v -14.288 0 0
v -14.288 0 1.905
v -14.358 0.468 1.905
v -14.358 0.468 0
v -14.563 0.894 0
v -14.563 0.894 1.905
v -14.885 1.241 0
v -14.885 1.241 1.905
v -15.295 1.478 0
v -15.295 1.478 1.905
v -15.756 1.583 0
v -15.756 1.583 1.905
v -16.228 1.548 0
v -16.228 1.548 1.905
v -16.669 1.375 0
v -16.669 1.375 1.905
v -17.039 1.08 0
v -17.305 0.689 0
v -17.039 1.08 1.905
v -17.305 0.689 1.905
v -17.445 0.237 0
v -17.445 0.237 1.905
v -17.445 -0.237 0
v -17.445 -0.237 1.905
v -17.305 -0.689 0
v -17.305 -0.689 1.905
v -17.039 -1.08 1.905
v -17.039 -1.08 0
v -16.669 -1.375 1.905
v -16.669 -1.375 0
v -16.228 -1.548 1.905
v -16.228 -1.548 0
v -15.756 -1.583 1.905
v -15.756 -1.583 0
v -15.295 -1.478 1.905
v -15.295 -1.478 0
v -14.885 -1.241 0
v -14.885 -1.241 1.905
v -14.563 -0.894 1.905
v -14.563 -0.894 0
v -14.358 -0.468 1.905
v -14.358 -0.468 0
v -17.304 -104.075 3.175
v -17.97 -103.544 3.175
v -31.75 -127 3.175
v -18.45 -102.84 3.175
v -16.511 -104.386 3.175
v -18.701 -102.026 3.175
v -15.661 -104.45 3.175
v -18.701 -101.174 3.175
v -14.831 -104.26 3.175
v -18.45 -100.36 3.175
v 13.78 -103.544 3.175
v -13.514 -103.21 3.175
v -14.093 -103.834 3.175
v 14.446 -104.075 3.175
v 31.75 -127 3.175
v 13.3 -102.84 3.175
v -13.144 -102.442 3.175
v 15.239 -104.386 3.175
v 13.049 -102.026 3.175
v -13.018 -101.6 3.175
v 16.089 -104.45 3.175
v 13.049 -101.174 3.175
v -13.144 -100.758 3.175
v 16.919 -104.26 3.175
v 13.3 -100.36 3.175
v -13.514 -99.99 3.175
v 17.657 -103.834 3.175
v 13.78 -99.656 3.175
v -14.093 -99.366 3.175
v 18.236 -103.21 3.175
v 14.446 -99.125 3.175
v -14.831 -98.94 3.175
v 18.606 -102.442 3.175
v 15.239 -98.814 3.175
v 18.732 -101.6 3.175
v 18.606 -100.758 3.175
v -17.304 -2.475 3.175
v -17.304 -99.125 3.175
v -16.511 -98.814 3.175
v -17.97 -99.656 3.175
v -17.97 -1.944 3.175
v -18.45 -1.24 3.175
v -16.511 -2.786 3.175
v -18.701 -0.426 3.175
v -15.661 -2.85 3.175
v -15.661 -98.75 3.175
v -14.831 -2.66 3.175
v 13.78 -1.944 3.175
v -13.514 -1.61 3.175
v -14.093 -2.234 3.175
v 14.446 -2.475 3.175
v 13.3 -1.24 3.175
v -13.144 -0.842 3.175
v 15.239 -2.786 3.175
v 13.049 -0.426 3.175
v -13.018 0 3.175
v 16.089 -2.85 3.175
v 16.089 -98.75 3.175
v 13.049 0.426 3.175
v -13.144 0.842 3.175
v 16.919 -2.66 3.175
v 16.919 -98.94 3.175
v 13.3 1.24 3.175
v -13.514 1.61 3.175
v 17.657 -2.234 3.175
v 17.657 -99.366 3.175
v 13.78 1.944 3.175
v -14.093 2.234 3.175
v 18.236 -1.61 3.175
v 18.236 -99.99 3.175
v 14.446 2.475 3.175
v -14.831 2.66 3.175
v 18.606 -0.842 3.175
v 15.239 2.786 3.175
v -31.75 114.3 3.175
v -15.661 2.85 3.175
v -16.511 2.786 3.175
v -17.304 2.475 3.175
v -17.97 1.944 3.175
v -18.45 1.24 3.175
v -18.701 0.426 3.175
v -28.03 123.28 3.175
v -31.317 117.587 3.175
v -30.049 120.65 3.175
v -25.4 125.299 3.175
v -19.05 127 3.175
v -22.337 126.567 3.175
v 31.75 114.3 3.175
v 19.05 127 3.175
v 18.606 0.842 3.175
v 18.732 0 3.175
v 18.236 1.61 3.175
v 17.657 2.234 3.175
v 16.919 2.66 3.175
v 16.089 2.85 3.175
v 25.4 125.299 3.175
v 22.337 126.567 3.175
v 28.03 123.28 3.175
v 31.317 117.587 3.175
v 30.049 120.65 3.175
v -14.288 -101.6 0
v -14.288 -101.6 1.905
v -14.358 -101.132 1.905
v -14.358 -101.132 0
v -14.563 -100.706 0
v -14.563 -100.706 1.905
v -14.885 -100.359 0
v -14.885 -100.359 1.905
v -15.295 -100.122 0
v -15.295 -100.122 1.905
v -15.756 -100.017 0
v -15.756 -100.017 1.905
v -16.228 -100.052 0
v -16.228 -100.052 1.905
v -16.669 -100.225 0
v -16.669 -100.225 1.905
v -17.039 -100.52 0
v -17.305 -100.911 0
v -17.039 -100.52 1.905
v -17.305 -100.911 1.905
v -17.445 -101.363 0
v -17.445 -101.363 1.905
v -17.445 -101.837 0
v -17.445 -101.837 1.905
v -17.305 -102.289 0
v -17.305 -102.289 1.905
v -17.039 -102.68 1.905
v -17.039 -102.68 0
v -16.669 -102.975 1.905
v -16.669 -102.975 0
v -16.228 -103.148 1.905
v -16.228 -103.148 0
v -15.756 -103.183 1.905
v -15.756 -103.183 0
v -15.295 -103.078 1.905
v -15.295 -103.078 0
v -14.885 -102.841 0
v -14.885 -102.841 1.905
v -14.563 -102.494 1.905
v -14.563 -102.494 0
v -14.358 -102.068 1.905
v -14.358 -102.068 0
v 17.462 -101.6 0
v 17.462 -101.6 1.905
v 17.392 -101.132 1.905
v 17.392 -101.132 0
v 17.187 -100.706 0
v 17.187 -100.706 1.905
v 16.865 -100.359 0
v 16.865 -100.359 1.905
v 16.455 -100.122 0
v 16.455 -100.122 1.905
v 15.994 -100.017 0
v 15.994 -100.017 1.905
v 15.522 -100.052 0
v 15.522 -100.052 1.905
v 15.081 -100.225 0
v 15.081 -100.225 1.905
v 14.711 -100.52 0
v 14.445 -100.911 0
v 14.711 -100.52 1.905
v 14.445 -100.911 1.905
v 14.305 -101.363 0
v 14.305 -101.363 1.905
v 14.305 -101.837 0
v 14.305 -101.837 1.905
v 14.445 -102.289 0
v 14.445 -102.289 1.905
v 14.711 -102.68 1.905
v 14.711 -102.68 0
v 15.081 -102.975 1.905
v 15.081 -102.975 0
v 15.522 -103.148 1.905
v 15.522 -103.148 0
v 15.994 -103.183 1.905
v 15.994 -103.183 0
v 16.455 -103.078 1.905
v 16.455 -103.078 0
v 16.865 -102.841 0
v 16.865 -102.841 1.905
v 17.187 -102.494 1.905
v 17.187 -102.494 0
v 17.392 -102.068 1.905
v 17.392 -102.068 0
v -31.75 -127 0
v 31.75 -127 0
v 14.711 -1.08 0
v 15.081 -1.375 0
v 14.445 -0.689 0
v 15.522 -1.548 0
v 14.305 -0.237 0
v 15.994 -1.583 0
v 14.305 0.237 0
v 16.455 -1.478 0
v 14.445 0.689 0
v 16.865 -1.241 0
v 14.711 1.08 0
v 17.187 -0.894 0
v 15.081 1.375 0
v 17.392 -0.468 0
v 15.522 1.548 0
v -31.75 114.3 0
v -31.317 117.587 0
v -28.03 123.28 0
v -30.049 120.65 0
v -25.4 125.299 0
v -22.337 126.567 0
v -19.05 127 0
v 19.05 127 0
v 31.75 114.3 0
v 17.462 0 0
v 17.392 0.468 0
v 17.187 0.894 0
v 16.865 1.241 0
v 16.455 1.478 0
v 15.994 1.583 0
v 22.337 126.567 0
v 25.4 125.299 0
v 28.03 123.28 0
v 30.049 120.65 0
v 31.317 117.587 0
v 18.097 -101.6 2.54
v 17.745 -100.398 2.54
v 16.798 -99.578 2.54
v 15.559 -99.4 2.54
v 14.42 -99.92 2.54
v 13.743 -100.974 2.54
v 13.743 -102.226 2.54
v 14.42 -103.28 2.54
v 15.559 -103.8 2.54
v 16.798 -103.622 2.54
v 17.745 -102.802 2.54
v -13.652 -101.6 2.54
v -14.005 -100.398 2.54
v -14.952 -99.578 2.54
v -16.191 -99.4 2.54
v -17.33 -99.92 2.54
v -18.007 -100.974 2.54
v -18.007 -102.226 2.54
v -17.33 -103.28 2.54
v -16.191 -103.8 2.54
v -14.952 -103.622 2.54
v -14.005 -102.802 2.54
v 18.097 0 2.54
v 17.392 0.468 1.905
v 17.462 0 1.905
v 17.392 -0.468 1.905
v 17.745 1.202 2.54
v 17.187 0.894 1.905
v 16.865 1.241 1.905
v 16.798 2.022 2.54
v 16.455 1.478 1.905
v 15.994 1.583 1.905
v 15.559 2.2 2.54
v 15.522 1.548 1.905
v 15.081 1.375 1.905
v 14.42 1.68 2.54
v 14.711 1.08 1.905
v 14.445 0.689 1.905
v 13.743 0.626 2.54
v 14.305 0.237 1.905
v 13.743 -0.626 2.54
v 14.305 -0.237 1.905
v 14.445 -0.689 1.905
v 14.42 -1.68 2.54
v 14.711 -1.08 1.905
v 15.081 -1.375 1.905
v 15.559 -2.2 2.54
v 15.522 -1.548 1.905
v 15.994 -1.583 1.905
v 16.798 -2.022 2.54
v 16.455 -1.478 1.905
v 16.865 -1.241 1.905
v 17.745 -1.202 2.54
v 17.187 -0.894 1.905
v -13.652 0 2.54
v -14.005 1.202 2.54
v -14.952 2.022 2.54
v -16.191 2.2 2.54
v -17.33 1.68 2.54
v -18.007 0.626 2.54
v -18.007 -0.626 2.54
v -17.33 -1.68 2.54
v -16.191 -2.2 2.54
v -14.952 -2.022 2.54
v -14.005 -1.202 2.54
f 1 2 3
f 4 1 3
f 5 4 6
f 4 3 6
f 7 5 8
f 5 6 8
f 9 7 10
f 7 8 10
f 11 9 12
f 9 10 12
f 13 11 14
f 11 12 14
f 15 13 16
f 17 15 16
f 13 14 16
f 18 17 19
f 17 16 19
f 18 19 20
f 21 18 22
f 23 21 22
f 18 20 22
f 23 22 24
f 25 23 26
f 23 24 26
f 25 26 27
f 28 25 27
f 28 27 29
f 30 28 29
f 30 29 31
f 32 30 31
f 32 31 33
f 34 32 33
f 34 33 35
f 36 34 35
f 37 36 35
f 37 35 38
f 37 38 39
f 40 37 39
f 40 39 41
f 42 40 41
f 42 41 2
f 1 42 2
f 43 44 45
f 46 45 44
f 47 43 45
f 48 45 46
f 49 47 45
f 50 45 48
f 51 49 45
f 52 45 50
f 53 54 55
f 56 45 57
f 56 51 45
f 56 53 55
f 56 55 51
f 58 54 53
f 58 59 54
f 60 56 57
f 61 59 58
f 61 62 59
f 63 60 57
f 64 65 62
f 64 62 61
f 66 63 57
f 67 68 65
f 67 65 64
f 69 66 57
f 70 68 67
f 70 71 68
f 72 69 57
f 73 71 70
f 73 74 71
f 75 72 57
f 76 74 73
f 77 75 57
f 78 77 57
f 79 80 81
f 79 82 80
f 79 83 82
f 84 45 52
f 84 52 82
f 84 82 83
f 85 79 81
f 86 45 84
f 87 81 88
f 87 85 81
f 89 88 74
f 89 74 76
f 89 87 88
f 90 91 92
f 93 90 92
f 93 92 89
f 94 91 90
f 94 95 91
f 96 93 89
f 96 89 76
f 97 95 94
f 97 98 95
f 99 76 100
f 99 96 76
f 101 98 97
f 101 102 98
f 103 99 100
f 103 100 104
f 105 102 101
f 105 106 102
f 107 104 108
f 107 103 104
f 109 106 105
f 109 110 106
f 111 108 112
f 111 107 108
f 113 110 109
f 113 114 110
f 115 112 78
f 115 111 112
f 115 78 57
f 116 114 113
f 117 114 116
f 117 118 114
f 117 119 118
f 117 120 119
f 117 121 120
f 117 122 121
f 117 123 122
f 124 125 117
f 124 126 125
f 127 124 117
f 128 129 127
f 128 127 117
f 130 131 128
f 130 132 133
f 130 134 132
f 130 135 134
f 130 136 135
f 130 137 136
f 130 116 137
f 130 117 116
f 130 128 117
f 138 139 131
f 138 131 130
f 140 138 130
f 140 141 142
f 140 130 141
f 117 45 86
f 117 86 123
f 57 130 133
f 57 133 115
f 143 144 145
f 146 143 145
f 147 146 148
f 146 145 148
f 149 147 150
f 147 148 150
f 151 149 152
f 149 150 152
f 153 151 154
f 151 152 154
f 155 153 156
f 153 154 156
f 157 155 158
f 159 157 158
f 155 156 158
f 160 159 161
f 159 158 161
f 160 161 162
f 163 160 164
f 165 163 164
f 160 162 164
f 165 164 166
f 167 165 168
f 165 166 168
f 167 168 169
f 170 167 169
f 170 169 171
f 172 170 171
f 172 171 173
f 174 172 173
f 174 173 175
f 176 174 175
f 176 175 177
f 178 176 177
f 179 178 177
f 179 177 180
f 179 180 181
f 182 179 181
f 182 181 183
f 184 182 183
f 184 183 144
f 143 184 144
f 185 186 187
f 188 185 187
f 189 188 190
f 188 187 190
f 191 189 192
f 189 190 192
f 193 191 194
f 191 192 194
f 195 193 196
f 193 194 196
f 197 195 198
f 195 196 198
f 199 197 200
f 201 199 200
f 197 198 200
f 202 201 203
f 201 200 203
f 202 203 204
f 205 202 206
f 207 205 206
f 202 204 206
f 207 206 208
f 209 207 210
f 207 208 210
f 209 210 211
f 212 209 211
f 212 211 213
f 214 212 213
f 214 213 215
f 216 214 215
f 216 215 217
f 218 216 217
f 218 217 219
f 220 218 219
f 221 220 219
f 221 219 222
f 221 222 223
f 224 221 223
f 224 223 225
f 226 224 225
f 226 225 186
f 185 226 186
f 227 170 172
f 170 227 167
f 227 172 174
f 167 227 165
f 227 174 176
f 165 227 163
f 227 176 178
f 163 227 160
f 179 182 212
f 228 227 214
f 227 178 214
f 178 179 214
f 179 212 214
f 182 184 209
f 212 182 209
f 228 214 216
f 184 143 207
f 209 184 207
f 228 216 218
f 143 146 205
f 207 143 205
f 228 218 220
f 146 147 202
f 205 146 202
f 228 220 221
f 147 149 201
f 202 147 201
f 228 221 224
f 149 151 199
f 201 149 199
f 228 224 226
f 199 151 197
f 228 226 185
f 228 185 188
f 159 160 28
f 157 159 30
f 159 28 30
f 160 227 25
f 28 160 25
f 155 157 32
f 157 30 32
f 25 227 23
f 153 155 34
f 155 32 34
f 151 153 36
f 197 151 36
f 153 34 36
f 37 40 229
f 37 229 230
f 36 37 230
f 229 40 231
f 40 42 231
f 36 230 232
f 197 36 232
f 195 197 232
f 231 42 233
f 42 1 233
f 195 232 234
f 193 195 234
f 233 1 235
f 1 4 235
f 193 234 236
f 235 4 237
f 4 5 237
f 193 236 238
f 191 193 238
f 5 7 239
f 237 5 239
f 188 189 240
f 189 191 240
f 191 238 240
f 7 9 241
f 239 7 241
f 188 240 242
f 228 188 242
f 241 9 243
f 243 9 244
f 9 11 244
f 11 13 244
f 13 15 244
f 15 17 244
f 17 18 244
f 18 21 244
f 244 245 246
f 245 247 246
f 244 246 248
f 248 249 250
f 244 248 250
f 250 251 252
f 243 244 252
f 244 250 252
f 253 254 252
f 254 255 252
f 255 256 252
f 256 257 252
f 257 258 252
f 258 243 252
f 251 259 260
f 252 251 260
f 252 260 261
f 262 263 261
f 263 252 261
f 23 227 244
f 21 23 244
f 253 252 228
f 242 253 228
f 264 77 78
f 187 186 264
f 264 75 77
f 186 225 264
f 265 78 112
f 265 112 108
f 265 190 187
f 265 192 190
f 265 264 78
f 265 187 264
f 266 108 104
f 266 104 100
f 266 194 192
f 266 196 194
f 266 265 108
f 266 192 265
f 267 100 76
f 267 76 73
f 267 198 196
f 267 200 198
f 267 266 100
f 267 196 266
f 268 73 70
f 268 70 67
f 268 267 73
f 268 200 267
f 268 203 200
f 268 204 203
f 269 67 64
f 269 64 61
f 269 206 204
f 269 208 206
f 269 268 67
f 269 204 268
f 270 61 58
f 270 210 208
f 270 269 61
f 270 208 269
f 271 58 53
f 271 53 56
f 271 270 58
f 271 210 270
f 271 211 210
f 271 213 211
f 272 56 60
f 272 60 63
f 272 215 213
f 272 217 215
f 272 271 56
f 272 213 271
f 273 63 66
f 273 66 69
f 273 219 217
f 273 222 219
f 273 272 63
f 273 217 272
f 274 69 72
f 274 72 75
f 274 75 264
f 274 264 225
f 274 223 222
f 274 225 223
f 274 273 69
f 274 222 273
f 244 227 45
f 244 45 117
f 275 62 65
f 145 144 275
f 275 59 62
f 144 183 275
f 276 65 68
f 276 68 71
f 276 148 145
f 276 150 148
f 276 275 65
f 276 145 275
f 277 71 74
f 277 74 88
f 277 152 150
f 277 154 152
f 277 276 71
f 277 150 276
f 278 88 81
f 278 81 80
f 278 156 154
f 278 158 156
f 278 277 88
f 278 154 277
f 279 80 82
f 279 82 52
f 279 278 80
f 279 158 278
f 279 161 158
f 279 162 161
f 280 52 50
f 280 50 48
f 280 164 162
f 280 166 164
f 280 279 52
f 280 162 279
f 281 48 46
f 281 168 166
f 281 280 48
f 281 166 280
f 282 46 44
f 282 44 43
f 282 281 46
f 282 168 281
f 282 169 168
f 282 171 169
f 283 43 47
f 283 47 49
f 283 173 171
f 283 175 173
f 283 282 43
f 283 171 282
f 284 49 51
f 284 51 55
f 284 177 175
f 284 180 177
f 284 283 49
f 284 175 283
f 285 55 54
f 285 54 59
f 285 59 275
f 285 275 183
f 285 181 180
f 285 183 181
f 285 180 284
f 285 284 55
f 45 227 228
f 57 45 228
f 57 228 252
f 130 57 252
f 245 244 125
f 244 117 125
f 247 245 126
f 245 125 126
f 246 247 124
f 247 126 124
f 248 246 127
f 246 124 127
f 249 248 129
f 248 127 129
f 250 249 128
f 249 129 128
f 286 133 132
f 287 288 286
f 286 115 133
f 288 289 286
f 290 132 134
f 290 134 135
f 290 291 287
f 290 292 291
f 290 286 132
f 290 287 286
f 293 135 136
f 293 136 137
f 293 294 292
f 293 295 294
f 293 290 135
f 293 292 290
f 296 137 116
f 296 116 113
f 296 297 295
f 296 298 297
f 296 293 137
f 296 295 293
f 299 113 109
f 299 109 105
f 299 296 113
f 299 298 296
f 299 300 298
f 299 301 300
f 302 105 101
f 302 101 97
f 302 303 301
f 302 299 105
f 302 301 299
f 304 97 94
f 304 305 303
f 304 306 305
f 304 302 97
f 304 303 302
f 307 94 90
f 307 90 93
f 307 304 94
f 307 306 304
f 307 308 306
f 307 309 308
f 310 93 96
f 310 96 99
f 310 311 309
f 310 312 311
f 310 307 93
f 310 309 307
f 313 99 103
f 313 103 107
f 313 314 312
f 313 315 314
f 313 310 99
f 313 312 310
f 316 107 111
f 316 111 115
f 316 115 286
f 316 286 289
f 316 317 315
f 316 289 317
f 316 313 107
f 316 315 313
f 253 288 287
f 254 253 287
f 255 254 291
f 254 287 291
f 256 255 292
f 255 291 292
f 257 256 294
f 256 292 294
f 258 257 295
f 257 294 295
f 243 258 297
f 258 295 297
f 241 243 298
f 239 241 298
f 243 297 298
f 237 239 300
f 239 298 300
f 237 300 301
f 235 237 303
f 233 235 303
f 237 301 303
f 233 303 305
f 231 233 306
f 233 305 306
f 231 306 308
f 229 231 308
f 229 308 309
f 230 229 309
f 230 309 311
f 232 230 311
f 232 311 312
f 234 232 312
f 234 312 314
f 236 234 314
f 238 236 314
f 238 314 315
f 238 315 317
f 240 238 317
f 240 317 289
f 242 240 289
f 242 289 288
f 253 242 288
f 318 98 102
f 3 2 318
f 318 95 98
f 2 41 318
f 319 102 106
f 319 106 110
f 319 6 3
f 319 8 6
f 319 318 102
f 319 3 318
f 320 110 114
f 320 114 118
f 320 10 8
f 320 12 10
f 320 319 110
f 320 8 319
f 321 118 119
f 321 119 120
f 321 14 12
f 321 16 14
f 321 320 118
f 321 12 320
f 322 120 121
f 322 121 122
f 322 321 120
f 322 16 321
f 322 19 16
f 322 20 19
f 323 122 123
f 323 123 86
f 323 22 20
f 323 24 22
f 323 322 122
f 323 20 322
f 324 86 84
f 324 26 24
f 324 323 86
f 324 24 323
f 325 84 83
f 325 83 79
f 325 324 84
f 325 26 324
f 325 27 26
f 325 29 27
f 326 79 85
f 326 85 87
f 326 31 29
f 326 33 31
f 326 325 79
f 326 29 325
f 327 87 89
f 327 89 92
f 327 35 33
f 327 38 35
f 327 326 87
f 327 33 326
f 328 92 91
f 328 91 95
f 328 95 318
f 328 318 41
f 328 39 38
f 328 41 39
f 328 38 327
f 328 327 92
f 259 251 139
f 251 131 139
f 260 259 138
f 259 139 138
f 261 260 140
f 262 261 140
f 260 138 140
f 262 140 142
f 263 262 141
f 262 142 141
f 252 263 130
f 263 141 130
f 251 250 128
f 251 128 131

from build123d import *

# Parameters (mm, degrees)
SKETCH1_W           = 63.5
SKETCH1_H           = 254
BOSS_EXTRUDE1_DEPTH = 3.175
CUT_EXTRUDE1_REACH  = 132.947
SKETCH2_R           = 1.5875
CHAMFER1_SIZE       = 1.27
FILLET1_R           = 12.7


with BuildPart() as part:
    # Sketch1 → Boss-Extrude1 (new body)
    with BuildSketch(Plane.XY):
        Rectangle(SKETCH1_W, SKETCH1_H)
    extrude(amount=BOSS_EXTRUDE1_DEPTH)

    # Sketch2 → Cut-Extrude1 (cut, up to next)
    with BuildSketch(Plane.XY.offset(3.175), mode=Mode.PRIVATE) as cut_extrude1_sk1:
        with Locations((15.875, -101.6)):
            Circle(SKETCH2_R)
    cut_extrude1_tool1 = extrude(cut_extrude1_sk1.sketch, amount=-CUT_EXTRUDE1_REACH, mode=Mode.PRIVATE) & part.part
    # Sketch2 → Cut-Extrude1 (cut, up to next)
    with BuildSketch(Plane.XY.offset(3.175), mode=Mode.PRIVATE) as cut_extrude1_sk2:
        with Locations((-15.875, -101.6)):
            Circle(SKETCH2_R)
    cut_extrude1_tool2 = extrude(cut_extrude1_sk2.sketch, amount=-CUT_EXTRUDE1_REACH, mode=Mode.PRIVATE) & part.part
    # Sketch2 → Cut-Extrude1 (cut, up to next)
    with BuildSketch(Plane.XY.offset(3.175), mode=Mode.PRIVATE) as cut_extrude1_sk3:
        with Locations((15.875, 0)):
            Circle(SKETCH2_R)
    cut_extrude1_tool3 = extrude(cut_extrude1_sk3.sketch, amount=-CUT_EXTRUDE1_REACH, mode=Mode.PRIVATE) & part.part
    # Sketch2 → Cut-Extrude1 (cut, up to next)
    with BuildSketch(Plane.XY.offset(3.175), mode=Mode.PRIVATE) as cut_extrude1_sk4:
        with Locations((-15.875, 0)):
            Circle(SKETCH2_R)
    cut_extrude1_tool4 = extrude(cut_extrude1_sk4.sketch, amount=-CUT_EXTRUDE1_REACH, mode=Mode.PRIVATE) & part.part
    add(cut_extrude1_tool1.solids().sort_by_distance((15.875, -101.6, 3.175))[0], mode=Mode.SUBTRACT)
    add(cut_extrude1_tool2.solids().sort_by_distance((-15.875, -101.6, 3.175))[0], mode=Mode.SUBTRACT)
    add(cut_extrude1_tool3.solids().sort_by_distance((15.875, 0, 3.175))[0], mode=Mode.SUBTRACT)
    add(cut_extrude1_tool4.solids().sort_by_distance((-15.875, 0, 3.175))[0], mode=Mode.SUBTRACT)

    # Chamfer1
    chamfer1_edges = [part.edges().sort_by_distance(p)[0] for p in [
        (14.2875, -101.6, 3.175),
        (-17.4625, -101.6, 3.175),
        (14.2875, 0, 3.175),
        (-17.4625, 0, 3.175),
    ]]
    chamfer(chamfer1_edges, length=CHAMFER1_SIZE)

    # Fillet1
    fillet1_edges = [part.edges().sort_by_distance(p)[0] for p in [
        (-31.75, 127, 1.5875),
        (31.75, 127, 1.5875),
    ]]
    fillet(fillet1_edges, radius=FILLET1_R)


solid = part.part
